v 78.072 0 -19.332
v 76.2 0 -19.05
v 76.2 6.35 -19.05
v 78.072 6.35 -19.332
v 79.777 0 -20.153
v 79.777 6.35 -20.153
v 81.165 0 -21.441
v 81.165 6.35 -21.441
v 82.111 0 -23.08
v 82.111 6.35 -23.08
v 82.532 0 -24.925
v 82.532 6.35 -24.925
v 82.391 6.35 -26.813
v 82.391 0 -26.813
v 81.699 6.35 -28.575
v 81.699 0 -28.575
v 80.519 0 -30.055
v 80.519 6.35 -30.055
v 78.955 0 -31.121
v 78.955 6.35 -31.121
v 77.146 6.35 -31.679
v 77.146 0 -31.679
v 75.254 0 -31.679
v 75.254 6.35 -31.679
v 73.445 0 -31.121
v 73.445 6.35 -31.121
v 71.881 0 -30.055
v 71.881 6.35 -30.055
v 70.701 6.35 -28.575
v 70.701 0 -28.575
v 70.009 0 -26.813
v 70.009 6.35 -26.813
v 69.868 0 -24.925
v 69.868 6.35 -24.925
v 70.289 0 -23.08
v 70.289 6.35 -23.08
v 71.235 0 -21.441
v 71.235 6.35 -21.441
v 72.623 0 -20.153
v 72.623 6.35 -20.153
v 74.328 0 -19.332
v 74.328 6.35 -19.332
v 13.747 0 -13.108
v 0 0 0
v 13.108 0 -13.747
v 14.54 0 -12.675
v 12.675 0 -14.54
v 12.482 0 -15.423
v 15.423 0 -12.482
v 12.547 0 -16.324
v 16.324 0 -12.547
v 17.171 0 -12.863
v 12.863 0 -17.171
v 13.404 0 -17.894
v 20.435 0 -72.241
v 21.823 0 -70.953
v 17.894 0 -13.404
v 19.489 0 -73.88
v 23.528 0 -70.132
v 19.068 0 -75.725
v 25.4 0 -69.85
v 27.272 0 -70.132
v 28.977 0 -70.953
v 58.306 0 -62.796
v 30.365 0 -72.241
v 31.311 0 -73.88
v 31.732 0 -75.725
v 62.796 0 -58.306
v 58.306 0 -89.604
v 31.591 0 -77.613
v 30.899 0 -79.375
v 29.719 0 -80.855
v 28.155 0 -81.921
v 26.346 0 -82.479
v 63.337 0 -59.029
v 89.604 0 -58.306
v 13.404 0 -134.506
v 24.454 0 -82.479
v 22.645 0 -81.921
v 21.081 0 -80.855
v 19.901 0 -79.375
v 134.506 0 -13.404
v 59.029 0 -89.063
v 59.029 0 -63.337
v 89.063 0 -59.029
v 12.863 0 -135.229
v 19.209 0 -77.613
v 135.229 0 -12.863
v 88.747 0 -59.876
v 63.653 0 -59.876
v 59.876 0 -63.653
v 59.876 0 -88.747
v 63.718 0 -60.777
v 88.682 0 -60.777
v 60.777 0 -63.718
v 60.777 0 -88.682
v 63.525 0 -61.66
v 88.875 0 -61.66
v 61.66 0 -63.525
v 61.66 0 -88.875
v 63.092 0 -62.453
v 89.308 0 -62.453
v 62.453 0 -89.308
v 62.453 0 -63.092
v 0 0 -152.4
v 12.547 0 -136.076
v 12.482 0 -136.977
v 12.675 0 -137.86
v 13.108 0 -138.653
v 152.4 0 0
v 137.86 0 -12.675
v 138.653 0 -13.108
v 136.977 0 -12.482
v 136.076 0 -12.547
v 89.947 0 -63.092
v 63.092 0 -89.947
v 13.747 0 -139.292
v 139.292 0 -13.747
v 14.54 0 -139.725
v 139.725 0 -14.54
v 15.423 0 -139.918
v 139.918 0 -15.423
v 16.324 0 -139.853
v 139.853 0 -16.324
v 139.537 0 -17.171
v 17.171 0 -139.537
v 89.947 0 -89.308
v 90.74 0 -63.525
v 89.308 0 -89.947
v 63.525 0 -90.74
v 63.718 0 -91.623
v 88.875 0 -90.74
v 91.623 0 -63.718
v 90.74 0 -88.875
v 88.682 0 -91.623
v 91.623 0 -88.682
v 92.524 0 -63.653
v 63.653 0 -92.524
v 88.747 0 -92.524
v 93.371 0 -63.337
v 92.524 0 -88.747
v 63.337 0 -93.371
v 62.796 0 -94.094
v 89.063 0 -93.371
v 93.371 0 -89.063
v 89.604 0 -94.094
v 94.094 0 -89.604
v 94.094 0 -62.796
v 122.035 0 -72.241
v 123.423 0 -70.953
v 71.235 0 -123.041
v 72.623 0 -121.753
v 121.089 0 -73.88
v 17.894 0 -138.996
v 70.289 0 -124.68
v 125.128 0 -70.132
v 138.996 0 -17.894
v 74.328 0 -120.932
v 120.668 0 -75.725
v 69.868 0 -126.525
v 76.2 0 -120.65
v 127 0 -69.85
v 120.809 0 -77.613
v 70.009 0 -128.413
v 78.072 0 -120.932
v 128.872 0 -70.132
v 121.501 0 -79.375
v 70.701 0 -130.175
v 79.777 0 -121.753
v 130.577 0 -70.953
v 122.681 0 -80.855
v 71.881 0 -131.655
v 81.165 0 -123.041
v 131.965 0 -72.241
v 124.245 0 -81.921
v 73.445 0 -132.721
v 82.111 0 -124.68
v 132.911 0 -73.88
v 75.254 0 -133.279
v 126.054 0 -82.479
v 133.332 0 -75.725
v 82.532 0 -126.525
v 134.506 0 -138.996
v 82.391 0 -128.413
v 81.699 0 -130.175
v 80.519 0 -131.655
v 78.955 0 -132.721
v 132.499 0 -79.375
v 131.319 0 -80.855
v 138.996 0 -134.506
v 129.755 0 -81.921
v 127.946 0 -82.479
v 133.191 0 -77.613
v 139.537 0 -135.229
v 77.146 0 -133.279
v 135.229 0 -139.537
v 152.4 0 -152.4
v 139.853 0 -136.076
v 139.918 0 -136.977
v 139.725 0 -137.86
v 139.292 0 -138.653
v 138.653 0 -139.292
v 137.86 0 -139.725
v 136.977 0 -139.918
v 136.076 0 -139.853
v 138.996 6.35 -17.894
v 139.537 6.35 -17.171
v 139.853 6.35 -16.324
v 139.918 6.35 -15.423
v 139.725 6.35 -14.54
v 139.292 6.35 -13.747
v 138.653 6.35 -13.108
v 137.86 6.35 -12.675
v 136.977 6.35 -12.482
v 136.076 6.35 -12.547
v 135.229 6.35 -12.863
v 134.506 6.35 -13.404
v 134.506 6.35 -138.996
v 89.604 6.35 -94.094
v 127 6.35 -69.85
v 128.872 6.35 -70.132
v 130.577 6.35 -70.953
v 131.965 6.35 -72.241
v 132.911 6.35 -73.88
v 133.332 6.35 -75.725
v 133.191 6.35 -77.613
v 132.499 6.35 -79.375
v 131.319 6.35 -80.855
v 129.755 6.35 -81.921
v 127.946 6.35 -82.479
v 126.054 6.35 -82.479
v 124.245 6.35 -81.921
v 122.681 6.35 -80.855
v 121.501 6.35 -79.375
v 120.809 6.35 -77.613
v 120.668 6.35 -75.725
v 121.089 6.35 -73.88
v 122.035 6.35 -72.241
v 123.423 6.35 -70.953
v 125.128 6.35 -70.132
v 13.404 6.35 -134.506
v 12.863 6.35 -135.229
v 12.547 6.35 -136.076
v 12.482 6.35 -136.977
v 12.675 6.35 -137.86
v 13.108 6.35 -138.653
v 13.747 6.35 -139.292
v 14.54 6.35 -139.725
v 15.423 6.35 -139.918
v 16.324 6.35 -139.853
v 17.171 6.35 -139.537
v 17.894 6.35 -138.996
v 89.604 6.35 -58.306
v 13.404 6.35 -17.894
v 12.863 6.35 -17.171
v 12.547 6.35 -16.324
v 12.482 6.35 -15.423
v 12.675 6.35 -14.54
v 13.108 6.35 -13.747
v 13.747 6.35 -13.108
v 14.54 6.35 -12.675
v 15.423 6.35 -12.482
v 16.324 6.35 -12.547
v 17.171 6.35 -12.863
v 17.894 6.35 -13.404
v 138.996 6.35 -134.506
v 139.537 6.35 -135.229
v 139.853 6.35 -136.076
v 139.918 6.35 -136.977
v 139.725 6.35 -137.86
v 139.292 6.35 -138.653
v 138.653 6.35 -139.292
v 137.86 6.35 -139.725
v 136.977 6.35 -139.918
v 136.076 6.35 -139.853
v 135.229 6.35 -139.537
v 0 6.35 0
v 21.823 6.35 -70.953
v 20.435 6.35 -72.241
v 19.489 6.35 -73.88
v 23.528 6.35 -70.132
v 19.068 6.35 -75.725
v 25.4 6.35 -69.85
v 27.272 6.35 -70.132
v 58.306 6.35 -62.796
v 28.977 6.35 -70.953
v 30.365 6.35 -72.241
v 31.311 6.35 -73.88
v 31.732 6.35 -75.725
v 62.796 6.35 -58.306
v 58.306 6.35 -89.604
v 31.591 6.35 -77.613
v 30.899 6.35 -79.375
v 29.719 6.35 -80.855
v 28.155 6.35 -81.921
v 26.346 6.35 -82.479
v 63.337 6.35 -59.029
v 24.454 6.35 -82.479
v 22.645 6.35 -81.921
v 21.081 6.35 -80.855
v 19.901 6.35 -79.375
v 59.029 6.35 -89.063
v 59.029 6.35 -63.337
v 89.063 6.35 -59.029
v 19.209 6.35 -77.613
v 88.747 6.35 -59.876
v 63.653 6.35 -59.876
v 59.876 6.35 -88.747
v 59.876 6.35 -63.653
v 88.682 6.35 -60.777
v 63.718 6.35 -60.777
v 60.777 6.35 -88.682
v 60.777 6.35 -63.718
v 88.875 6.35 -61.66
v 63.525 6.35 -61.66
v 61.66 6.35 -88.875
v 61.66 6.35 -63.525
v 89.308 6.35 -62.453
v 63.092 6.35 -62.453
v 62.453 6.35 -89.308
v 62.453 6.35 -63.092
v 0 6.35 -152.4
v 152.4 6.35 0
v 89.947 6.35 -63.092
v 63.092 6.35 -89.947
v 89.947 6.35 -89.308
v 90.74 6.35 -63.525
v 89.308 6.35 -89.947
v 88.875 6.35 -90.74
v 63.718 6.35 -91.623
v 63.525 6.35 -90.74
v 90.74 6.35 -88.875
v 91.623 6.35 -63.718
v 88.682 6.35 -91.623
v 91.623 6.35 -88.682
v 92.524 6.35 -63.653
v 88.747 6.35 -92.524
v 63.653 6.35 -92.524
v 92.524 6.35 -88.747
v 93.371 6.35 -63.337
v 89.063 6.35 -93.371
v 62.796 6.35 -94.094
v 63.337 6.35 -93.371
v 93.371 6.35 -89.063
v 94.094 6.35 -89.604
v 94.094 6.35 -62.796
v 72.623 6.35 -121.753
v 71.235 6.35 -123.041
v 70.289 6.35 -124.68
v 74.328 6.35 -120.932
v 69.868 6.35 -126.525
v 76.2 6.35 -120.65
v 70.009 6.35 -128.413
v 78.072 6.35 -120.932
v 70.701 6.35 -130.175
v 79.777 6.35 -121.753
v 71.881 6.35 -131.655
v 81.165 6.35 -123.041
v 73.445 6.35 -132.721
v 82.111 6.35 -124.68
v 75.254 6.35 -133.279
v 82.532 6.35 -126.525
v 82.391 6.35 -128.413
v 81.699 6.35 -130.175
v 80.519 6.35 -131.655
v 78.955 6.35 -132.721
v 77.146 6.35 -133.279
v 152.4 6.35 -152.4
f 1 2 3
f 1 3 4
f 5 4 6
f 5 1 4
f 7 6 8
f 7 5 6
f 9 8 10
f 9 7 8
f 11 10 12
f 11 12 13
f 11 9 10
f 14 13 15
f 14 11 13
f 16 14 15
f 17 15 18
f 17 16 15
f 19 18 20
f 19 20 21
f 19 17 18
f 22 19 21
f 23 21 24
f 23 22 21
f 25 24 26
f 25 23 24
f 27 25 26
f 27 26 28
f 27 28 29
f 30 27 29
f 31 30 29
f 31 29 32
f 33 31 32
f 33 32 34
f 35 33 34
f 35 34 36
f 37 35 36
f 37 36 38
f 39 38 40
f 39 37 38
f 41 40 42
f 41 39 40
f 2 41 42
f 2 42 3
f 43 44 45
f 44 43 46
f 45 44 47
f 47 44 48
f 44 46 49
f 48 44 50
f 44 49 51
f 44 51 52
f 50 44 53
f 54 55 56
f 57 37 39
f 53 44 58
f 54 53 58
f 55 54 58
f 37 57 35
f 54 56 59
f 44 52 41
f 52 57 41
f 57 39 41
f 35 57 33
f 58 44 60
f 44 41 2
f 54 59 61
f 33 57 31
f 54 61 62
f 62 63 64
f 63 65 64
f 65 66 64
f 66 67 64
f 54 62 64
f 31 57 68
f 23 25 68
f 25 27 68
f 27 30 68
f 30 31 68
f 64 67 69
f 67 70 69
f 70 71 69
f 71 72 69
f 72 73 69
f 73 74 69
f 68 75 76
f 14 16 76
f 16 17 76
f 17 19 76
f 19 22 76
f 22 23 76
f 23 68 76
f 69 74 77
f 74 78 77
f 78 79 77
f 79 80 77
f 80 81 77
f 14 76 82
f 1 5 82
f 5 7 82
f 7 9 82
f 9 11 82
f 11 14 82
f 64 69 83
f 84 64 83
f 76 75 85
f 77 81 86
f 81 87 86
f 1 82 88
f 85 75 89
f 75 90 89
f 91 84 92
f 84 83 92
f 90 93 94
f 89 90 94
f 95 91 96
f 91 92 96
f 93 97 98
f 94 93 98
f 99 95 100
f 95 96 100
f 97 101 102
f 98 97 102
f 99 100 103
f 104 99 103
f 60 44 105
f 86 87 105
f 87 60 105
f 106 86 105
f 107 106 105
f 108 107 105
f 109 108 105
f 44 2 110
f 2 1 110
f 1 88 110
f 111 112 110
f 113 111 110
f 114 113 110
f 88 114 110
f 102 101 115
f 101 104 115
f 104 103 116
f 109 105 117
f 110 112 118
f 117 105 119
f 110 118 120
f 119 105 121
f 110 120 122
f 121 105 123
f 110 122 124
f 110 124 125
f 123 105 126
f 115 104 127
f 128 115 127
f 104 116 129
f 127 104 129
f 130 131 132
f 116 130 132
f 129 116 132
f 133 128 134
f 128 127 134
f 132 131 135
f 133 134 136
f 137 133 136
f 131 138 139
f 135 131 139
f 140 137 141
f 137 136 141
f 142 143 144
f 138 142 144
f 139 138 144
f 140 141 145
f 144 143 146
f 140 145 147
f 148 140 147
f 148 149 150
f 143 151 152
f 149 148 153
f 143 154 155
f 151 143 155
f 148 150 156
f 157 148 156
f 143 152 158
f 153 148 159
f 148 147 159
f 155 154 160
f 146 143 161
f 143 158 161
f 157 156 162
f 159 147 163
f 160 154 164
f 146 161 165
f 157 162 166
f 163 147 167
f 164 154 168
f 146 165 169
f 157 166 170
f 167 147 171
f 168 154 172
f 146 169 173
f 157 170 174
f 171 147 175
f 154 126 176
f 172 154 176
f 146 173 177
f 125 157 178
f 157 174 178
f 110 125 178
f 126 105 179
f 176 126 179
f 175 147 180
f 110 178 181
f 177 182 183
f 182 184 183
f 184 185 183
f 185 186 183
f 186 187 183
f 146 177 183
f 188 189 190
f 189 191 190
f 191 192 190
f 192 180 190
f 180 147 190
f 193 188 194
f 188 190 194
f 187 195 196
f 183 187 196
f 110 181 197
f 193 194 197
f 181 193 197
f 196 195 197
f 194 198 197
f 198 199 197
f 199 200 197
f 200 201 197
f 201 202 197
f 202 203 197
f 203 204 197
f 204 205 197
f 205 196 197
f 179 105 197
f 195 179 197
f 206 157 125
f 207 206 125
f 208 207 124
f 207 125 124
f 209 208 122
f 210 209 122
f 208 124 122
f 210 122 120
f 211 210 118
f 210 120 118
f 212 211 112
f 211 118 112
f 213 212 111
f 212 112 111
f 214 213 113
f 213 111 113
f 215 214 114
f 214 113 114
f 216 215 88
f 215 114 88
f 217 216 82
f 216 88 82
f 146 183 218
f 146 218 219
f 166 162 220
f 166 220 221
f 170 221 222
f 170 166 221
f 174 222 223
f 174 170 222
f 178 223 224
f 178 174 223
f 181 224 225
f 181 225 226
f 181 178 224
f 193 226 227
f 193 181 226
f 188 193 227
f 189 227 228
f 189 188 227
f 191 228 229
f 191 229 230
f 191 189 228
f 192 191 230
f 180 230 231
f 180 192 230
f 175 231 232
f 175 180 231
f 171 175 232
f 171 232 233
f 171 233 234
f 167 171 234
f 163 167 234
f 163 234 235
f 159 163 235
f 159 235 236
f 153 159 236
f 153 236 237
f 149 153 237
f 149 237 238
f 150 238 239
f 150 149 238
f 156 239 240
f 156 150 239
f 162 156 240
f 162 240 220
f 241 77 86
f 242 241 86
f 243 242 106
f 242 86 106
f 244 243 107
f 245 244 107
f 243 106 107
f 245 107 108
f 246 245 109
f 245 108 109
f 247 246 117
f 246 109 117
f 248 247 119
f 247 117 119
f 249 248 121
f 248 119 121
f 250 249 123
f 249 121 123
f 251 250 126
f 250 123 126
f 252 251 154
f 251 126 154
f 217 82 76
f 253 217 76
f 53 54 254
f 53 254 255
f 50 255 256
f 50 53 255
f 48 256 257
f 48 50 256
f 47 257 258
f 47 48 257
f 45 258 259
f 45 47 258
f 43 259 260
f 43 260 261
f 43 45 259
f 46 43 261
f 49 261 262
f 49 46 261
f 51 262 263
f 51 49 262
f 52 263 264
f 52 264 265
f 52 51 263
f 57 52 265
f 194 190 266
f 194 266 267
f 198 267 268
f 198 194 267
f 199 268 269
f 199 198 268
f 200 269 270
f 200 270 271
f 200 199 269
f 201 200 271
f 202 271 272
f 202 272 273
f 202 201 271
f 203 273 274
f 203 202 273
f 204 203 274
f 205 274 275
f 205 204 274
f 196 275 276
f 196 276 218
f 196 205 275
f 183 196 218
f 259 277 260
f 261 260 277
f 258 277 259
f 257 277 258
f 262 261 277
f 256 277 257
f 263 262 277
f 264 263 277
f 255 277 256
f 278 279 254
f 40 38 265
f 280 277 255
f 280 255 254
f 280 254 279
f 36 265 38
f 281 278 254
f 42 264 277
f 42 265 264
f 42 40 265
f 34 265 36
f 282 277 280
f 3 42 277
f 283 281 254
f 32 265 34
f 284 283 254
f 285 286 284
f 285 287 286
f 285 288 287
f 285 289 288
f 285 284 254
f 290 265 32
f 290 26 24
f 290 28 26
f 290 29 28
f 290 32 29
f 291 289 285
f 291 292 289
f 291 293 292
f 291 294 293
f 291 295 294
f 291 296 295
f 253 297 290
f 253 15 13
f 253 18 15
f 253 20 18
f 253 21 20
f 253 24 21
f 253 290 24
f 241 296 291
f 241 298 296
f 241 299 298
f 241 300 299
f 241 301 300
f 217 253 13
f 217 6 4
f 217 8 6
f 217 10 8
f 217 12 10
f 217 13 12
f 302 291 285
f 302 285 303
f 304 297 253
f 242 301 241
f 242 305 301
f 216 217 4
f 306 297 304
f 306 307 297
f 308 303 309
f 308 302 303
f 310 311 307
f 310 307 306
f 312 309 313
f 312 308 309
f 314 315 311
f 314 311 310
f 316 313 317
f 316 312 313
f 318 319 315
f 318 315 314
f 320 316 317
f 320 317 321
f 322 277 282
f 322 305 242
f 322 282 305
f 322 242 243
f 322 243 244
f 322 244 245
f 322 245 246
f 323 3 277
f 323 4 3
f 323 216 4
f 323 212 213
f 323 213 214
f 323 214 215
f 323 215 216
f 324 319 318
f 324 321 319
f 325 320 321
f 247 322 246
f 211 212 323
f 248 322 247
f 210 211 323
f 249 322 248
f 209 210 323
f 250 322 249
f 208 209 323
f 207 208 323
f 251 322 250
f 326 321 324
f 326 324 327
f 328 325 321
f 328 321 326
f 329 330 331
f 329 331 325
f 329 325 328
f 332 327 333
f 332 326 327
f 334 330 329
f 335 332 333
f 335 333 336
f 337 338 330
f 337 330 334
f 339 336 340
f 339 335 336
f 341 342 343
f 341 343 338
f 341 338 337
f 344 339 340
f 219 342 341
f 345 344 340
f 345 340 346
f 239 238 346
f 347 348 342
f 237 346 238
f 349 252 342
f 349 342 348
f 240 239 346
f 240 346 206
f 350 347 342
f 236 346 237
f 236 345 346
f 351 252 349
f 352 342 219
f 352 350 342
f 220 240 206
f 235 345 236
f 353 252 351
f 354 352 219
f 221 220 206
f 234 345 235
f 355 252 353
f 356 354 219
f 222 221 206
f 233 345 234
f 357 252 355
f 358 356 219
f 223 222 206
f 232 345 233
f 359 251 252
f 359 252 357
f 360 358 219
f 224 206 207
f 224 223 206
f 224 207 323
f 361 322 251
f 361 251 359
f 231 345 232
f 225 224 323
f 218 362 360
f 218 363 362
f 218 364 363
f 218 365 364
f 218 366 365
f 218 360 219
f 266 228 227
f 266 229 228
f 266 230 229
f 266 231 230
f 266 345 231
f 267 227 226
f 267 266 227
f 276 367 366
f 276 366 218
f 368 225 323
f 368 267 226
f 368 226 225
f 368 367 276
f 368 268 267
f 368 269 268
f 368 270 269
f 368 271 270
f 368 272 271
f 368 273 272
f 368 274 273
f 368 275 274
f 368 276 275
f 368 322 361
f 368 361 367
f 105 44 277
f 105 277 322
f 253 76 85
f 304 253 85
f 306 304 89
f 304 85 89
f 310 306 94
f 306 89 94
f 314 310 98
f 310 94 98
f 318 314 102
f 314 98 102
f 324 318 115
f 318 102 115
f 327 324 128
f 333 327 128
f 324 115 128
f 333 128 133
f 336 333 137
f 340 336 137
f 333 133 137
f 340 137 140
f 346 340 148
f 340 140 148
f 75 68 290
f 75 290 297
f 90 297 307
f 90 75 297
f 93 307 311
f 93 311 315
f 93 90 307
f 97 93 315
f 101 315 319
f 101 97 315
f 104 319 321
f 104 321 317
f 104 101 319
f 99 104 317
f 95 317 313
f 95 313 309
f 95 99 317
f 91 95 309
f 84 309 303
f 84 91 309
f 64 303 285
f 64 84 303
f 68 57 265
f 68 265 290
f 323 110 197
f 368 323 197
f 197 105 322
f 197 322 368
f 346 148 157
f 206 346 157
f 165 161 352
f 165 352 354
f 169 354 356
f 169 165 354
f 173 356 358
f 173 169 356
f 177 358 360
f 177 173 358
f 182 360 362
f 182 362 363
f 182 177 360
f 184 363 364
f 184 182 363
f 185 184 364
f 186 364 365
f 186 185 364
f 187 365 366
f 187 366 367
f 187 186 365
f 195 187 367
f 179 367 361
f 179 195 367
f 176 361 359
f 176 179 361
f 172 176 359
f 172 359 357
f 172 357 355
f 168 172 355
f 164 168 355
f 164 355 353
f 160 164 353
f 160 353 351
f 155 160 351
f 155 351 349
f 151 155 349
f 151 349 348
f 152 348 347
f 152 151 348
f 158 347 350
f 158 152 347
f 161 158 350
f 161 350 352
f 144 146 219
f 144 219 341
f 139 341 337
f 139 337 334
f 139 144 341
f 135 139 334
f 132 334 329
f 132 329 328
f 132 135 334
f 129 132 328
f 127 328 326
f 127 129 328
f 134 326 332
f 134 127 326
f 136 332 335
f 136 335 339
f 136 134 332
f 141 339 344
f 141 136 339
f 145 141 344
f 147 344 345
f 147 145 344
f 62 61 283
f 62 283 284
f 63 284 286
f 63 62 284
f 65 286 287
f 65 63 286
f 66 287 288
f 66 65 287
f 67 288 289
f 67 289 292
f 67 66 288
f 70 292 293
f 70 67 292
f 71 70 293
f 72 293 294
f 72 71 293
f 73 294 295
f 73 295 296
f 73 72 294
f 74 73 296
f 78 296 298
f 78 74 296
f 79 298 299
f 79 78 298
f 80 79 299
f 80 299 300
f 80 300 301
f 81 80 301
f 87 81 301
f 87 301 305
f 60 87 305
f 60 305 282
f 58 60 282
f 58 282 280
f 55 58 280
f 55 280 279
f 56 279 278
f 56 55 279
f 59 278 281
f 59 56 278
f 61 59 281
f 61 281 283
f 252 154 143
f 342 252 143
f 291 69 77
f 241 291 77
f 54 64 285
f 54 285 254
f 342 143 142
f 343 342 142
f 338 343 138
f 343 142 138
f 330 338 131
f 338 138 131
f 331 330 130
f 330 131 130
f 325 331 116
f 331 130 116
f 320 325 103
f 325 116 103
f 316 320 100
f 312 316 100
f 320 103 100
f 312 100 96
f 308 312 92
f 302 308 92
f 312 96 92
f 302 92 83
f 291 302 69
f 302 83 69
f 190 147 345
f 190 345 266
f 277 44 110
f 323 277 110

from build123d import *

# Parameters (mm, degrees)
SKETCH1_W           = 152.4
SKETCH1_H           = 152.4
SKETCH1_R           = 6.35
BOSS_EXTRUDE1_DEPTH = 6.35


with BuildPart() as part:
    # Sketch1 → Boss-Extrude1 (new body)
    with BuildSketch(Plane(origin=(0, 0, 0), x_dir=(1, 0, 0), z_dir=(0, 1, 0))):
        with Locations((76.2, 76.2)):
            Rectangle(SKETCH1_W, SKETCH1_H)
        with Locations(Location((25.4, 76.2, 0), (0, 0, 270))):
            Circle(SKETCH1_R, mode=Mode.SUBTRACT)
        with Locations(Location((76.2, 127, 0), (0, 0, 270))):
            Circle(SKETCH1_R, mode=Mode.SUBTRACT)
        with Locations(Location((127, 76.2, 0), (0, 0, 270))):
            Circle(SKETCH1_R, mode=Mode.SUBTRACT)
        with Locations(Location((76.2, 25.4, 0), (0, 0, 270))):
            Circle(SKETCH1_R, mode=Mode.SUBTRACT)
        with BuildLine():
            Line((17.894423728, 138.995704333), (62.795704333, 94.094423728))
            ThreePointArc((62.795704333, 94.094423728), (62.795704333, 89.604295667), (58.305576272, 89.604295667))
            Line((58.305576272, 89.604295667), (13.404295667, 134.505576272))
            ThreePointArc((13.404295667, 134.505576272), (13.404295667, 138.995704333), (17.894423728, 138.995704333))
        make_face(mode=Mode.SUBTRACT)
        with BuildLine():
            Line((134.505576272, 138.995704333), (89.604295667, 94.094423728))
            ThreePointArc((89.604295667, 94.094423728), (89.604295667, 89.604295667), (94.094423728, 89.604295667))
            Line((94.094423728, 89.604295667), (138.995704333, 134.505576272))
            ThreePointArc((138.995704333, 134.505576272), (138.995704333, 138.995704333), (134.505576272, 138.995704333))
        make_face(mode=Mode.SUBTRACT)
        with BuildLine():
            Line((134.505576272, 13.404295667), (89.604295667, 58.305576272))
            ThreePointArc((89.604295667, 58.305576272), (89.604295667, 62.795704333), (94.094423728, 62.795704333))
            Line((94.094423728, 62.795704333), (138.995704333, 17.894423728))
            ThreePointArc((138.995704333, 17.894423728), (138.995704333, 13.404295667), (134.505576272, 13.404295667))
        make_face(mode=Mode.SUBTRACT)
        with BuildLine():
            Line((17.894423728, 13.404295667), (62.795704333, 58.305576272))
            ThreePointArc((62.795704333, 58.305576272), (62.795704333, 62.795704333), (58.305576272, 62.795704333))
            Line((58.305576272, 62.795704333), (13.404295667, 17.894423728))
            ThreePointArc((13.404295667, 17.894423728), (13.404295667, 13.404295667), (17.894423728, 13.404295667))
        make_face(mode=Mode.SUBTRACT)
    extrude(amount=BOSS_EXTRUDE1_DEPTH)


solid = part.part
